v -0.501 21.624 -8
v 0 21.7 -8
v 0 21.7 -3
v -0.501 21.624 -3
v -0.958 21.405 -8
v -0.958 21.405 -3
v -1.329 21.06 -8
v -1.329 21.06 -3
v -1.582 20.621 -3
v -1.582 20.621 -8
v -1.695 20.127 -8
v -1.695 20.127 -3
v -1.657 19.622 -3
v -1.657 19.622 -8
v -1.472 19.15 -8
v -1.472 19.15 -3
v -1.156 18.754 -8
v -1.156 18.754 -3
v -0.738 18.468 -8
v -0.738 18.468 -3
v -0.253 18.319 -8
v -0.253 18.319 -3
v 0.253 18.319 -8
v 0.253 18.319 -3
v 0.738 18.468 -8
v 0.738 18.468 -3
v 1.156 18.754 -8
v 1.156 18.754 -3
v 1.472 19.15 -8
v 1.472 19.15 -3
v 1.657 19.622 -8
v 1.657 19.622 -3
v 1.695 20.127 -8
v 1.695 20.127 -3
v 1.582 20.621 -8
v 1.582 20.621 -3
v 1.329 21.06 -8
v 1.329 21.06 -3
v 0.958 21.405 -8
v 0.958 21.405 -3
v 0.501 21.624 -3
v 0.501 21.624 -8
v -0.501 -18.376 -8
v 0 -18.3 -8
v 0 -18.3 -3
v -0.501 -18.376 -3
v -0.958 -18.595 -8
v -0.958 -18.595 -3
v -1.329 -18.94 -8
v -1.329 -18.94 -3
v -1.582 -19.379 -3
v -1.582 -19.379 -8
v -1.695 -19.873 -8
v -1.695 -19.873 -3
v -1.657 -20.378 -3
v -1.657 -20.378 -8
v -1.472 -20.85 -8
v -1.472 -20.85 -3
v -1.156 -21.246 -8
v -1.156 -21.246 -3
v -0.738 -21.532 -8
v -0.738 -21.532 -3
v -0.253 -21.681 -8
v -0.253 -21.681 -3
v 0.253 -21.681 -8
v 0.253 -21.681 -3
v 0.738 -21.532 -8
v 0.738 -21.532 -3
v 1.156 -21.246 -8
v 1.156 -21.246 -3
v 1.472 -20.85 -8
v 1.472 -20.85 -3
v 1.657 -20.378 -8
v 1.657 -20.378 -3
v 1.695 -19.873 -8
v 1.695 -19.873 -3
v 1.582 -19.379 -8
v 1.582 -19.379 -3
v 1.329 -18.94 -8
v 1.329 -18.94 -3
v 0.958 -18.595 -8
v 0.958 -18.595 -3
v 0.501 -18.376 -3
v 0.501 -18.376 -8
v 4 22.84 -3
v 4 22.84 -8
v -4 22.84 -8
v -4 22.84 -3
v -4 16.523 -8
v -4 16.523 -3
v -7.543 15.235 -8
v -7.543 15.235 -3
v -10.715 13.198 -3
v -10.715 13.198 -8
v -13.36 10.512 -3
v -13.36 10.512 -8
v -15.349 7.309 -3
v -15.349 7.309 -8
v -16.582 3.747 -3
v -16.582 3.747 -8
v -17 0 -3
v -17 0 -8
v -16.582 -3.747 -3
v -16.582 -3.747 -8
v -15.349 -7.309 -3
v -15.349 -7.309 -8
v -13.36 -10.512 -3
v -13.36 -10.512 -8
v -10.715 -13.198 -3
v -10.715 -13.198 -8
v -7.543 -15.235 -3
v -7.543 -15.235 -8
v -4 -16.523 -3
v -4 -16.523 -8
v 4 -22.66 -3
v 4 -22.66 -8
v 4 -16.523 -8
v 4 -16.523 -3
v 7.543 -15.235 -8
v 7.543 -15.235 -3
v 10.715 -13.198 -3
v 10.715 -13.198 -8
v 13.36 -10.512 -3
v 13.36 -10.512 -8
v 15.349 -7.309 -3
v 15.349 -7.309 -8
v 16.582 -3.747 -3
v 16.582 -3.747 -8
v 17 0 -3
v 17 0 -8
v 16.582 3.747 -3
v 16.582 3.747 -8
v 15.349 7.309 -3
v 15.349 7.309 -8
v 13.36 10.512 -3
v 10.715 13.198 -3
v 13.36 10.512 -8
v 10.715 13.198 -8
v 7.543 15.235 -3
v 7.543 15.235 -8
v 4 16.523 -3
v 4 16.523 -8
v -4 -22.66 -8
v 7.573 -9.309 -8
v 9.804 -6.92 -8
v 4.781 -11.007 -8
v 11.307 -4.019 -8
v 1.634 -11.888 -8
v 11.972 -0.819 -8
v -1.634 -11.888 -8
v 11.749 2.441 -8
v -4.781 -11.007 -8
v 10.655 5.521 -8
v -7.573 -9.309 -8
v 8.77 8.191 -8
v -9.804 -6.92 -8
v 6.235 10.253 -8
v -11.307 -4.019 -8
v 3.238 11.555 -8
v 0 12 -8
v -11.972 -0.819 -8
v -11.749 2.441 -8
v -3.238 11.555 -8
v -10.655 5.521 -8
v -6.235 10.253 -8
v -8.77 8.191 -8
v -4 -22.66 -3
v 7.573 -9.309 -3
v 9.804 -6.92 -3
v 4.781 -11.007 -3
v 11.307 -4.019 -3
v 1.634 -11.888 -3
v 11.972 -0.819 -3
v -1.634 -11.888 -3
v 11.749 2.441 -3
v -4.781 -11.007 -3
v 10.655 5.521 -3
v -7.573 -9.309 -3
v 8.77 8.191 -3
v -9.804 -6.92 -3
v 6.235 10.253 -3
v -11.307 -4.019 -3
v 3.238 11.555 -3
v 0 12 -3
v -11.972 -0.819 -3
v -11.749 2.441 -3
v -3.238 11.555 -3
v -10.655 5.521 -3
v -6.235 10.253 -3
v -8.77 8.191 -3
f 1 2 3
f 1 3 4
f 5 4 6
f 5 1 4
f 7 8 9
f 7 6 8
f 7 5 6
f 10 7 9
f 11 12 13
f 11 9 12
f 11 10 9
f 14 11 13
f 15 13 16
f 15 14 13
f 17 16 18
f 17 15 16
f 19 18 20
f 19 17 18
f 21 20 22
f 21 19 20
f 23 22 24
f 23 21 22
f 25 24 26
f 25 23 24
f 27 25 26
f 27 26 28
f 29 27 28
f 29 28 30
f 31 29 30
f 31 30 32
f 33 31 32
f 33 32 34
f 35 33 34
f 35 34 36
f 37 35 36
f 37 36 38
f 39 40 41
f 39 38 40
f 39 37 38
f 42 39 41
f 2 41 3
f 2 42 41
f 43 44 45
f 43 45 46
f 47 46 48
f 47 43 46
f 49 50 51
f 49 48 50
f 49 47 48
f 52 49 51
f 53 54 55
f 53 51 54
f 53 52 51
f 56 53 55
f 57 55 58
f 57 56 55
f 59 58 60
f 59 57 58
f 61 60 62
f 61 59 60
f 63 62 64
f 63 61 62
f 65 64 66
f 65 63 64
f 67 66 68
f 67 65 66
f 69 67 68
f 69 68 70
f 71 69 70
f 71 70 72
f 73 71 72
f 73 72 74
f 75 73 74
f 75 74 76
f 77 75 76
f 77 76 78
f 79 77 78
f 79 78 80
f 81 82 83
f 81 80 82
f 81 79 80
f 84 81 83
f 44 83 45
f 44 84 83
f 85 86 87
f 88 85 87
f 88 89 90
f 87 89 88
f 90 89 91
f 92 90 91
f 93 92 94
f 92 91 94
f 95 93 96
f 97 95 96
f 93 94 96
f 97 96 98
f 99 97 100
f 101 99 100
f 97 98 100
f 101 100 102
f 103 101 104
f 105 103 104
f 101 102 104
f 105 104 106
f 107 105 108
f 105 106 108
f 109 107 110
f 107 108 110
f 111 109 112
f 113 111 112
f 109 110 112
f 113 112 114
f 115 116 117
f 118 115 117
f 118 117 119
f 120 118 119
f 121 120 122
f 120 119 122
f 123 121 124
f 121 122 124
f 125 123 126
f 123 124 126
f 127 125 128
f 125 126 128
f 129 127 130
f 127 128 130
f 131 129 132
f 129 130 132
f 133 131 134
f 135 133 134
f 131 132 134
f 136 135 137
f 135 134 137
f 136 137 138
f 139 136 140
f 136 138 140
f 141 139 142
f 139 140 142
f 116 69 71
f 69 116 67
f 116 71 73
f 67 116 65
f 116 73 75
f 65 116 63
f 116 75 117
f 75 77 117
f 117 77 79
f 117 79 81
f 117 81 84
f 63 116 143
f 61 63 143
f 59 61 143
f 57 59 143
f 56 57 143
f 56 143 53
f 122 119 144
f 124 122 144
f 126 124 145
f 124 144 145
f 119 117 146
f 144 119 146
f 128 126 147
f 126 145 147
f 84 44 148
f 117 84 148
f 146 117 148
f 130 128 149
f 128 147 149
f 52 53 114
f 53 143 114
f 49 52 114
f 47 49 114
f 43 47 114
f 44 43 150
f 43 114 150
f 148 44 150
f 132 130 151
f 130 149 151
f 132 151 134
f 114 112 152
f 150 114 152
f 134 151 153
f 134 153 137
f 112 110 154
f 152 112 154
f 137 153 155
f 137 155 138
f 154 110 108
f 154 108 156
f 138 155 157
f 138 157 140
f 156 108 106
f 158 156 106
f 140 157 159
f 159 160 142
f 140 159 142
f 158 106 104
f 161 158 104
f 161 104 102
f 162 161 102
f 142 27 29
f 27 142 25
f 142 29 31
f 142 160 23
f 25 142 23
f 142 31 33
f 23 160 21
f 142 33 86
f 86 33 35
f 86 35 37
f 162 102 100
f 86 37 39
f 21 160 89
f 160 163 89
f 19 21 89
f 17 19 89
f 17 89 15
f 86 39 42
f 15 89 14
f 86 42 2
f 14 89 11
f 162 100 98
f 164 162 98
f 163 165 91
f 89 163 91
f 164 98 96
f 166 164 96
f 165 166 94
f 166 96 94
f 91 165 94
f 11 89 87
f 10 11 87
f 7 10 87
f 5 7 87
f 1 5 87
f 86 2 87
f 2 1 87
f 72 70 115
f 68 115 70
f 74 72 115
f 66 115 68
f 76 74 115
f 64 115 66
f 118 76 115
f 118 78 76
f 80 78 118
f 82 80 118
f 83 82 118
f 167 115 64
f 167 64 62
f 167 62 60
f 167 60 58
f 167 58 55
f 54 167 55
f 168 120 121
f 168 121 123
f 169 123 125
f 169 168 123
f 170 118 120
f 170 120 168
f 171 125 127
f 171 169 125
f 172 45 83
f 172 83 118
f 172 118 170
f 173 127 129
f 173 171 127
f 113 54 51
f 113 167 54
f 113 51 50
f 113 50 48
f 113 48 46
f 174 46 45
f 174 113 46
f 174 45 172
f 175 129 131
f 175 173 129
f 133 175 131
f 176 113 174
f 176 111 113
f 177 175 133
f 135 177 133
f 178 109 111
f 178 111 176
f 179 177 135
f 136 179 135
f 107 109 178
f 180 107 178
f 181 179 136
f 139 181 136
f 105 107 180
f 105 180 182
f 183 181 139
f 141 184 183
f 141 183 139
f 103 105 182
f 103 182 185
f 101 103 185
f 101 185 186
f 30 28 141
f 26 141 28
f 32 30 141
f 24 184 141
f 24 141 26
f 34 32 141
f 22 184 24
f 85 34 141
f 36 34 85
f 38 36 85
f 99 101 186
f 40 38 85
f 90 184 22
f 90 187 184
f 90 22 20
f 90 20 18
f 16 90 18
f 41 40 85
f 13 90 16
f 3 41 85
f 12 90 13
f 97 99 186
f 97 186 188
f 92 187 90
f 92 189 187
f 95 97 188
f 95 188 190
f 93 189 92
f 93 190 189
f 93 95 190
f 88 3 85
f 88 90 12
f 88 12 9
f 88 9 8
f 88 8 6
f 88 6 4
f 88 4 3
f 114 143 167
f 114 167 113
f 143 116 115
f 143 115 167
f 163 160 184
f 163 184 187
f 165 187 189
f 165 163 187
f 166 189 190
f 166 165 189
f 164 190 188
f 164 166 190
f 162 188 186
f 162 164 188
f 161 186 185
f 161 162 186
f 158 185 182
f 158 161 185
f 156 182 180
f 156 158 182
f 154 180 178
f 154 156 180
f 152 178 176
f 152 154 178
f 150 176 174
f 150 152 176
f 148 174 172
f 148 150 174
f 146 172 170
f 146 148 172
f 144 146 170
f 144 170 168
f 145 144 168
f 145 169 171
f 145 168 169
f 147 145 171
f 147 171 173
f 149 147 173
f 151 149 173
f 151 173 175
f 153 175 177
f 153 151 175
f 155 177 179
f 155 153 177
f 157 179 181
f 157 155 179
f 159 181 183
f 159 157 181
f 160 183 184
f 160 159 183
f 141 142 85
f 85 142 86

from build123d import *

# Parameters (mm, degrees)
CYLINDER_R          = 2
CYLINDER_DEPTH      = 10
CYLINDER098_R       = 1.7
CYLINDER098_DEPTH   = 14
CYLINDER097_R       = 12
CYLINDER097_DEPTH   = 33
CYLINDER099_R       = 1.7
CYLINDER099_DEPTH   = 14
BOX017_W            = 45.5
BOX017_H            = 8
BOX017_DEPTH        = 5
CYLINDER096_R       = 17
CYLINDER096_DEPTH   = 5
CUT_PLACEMENT_ANGLE = 90


with BuildPart() as cylinder:
    # Cylinder → Cylinder (new body)
    with BuildSketch(Plane(origin=(0, 57, 0), x_dir=(1, 0, 0), z_dir=(0, 0, 1))):
        Circle(CYLINDER_R)
    extrude(amount=CYLINDER_DEPTH)


with BuildPart() as ftinsmount003:
    # Cylinder098 → Cylinder098 (new body)
    with BuildSketch(Plane(origin=(53.66, 148, -15), x_dir=(1, 0, 0), z_dir=(0, 0, 1))):
        Circle(CYLINDER098_R)
    extrude(amount=CYLINDER098_DEPTH)


with BuildPart() as ftinsinnerhole002:
    # Cylinder097 → Cylinder097 (new body)
    with BuildSketch(Plane(origin=(73.66, 148, -10), x_dir=(1, 0, 0), z_dir=(0, 0, 1))):
        Circle(CYLINDER097_R)
    extrude(amount=CYLINDER097_DEPTH)


with BuildPart() as fusion041:
    # Cylinder099 → Cylinder099 (new body)
    with BuildSketch(Plane(origin=(93.66, 148, -14), x_dir=(1, 0, 0), z_dir=(0, 0, 1))):
        Circle(CYLINDER099_R)
    extrude(amount=CYLINDER099_DEPTH)

    # Fusion041: union FTInsMount003, FTInsInnerHole002
    add(ftinsmount003.part)
    add(ftinsinnerhole002.part)


with BuildPart() as ftinslug001:
    # Box017 → Box017 (new body)
    with BuildSketch(Plane(origin=(51, 144, -10), x_dir=(1, 0, 0), z_dir=(0, 0, 1))):
        with Locations((22.75, 4)):
            Rectangle(BOX017_W, BOX017_H)
    extrude(amount=BOX017_DEPTH)


with BuildPart() as cut:
    # Cylinder096 → Cylinder096 (new body)
    with BuildSketch(Plane(origin=(73.66, 148, -10), x_dir=(1, 0, 0), z_dir=(0, 0, 1))):
        Circle(CYLINDER096_R)
    extrude(amount=CYLINDER096_DEPTH)

    # Fusion042: union FTInsLug001
    add(ftinslug001.part)

    # Cut011: cut Fusion041
    add(fusion041.part, mode=Mode.SUBTRACT)


with BuildPart() as cut_1:
    # Cut011 placement: moved
    add(cut.part.moved(Location((-73.66, -148, 2))))

    # Cut: cut Cylinder
    add(cylinder.part, mode=Mode.SUBTRACT)


with BuildPart() as cut_2:
    # Cut placement: moved
    add(cut_1.part.rotate(Axis((0, 0, 0), (0, 0, 1)), CUT_PLACEMENT_ANGLE))


solid = cut_2.part
